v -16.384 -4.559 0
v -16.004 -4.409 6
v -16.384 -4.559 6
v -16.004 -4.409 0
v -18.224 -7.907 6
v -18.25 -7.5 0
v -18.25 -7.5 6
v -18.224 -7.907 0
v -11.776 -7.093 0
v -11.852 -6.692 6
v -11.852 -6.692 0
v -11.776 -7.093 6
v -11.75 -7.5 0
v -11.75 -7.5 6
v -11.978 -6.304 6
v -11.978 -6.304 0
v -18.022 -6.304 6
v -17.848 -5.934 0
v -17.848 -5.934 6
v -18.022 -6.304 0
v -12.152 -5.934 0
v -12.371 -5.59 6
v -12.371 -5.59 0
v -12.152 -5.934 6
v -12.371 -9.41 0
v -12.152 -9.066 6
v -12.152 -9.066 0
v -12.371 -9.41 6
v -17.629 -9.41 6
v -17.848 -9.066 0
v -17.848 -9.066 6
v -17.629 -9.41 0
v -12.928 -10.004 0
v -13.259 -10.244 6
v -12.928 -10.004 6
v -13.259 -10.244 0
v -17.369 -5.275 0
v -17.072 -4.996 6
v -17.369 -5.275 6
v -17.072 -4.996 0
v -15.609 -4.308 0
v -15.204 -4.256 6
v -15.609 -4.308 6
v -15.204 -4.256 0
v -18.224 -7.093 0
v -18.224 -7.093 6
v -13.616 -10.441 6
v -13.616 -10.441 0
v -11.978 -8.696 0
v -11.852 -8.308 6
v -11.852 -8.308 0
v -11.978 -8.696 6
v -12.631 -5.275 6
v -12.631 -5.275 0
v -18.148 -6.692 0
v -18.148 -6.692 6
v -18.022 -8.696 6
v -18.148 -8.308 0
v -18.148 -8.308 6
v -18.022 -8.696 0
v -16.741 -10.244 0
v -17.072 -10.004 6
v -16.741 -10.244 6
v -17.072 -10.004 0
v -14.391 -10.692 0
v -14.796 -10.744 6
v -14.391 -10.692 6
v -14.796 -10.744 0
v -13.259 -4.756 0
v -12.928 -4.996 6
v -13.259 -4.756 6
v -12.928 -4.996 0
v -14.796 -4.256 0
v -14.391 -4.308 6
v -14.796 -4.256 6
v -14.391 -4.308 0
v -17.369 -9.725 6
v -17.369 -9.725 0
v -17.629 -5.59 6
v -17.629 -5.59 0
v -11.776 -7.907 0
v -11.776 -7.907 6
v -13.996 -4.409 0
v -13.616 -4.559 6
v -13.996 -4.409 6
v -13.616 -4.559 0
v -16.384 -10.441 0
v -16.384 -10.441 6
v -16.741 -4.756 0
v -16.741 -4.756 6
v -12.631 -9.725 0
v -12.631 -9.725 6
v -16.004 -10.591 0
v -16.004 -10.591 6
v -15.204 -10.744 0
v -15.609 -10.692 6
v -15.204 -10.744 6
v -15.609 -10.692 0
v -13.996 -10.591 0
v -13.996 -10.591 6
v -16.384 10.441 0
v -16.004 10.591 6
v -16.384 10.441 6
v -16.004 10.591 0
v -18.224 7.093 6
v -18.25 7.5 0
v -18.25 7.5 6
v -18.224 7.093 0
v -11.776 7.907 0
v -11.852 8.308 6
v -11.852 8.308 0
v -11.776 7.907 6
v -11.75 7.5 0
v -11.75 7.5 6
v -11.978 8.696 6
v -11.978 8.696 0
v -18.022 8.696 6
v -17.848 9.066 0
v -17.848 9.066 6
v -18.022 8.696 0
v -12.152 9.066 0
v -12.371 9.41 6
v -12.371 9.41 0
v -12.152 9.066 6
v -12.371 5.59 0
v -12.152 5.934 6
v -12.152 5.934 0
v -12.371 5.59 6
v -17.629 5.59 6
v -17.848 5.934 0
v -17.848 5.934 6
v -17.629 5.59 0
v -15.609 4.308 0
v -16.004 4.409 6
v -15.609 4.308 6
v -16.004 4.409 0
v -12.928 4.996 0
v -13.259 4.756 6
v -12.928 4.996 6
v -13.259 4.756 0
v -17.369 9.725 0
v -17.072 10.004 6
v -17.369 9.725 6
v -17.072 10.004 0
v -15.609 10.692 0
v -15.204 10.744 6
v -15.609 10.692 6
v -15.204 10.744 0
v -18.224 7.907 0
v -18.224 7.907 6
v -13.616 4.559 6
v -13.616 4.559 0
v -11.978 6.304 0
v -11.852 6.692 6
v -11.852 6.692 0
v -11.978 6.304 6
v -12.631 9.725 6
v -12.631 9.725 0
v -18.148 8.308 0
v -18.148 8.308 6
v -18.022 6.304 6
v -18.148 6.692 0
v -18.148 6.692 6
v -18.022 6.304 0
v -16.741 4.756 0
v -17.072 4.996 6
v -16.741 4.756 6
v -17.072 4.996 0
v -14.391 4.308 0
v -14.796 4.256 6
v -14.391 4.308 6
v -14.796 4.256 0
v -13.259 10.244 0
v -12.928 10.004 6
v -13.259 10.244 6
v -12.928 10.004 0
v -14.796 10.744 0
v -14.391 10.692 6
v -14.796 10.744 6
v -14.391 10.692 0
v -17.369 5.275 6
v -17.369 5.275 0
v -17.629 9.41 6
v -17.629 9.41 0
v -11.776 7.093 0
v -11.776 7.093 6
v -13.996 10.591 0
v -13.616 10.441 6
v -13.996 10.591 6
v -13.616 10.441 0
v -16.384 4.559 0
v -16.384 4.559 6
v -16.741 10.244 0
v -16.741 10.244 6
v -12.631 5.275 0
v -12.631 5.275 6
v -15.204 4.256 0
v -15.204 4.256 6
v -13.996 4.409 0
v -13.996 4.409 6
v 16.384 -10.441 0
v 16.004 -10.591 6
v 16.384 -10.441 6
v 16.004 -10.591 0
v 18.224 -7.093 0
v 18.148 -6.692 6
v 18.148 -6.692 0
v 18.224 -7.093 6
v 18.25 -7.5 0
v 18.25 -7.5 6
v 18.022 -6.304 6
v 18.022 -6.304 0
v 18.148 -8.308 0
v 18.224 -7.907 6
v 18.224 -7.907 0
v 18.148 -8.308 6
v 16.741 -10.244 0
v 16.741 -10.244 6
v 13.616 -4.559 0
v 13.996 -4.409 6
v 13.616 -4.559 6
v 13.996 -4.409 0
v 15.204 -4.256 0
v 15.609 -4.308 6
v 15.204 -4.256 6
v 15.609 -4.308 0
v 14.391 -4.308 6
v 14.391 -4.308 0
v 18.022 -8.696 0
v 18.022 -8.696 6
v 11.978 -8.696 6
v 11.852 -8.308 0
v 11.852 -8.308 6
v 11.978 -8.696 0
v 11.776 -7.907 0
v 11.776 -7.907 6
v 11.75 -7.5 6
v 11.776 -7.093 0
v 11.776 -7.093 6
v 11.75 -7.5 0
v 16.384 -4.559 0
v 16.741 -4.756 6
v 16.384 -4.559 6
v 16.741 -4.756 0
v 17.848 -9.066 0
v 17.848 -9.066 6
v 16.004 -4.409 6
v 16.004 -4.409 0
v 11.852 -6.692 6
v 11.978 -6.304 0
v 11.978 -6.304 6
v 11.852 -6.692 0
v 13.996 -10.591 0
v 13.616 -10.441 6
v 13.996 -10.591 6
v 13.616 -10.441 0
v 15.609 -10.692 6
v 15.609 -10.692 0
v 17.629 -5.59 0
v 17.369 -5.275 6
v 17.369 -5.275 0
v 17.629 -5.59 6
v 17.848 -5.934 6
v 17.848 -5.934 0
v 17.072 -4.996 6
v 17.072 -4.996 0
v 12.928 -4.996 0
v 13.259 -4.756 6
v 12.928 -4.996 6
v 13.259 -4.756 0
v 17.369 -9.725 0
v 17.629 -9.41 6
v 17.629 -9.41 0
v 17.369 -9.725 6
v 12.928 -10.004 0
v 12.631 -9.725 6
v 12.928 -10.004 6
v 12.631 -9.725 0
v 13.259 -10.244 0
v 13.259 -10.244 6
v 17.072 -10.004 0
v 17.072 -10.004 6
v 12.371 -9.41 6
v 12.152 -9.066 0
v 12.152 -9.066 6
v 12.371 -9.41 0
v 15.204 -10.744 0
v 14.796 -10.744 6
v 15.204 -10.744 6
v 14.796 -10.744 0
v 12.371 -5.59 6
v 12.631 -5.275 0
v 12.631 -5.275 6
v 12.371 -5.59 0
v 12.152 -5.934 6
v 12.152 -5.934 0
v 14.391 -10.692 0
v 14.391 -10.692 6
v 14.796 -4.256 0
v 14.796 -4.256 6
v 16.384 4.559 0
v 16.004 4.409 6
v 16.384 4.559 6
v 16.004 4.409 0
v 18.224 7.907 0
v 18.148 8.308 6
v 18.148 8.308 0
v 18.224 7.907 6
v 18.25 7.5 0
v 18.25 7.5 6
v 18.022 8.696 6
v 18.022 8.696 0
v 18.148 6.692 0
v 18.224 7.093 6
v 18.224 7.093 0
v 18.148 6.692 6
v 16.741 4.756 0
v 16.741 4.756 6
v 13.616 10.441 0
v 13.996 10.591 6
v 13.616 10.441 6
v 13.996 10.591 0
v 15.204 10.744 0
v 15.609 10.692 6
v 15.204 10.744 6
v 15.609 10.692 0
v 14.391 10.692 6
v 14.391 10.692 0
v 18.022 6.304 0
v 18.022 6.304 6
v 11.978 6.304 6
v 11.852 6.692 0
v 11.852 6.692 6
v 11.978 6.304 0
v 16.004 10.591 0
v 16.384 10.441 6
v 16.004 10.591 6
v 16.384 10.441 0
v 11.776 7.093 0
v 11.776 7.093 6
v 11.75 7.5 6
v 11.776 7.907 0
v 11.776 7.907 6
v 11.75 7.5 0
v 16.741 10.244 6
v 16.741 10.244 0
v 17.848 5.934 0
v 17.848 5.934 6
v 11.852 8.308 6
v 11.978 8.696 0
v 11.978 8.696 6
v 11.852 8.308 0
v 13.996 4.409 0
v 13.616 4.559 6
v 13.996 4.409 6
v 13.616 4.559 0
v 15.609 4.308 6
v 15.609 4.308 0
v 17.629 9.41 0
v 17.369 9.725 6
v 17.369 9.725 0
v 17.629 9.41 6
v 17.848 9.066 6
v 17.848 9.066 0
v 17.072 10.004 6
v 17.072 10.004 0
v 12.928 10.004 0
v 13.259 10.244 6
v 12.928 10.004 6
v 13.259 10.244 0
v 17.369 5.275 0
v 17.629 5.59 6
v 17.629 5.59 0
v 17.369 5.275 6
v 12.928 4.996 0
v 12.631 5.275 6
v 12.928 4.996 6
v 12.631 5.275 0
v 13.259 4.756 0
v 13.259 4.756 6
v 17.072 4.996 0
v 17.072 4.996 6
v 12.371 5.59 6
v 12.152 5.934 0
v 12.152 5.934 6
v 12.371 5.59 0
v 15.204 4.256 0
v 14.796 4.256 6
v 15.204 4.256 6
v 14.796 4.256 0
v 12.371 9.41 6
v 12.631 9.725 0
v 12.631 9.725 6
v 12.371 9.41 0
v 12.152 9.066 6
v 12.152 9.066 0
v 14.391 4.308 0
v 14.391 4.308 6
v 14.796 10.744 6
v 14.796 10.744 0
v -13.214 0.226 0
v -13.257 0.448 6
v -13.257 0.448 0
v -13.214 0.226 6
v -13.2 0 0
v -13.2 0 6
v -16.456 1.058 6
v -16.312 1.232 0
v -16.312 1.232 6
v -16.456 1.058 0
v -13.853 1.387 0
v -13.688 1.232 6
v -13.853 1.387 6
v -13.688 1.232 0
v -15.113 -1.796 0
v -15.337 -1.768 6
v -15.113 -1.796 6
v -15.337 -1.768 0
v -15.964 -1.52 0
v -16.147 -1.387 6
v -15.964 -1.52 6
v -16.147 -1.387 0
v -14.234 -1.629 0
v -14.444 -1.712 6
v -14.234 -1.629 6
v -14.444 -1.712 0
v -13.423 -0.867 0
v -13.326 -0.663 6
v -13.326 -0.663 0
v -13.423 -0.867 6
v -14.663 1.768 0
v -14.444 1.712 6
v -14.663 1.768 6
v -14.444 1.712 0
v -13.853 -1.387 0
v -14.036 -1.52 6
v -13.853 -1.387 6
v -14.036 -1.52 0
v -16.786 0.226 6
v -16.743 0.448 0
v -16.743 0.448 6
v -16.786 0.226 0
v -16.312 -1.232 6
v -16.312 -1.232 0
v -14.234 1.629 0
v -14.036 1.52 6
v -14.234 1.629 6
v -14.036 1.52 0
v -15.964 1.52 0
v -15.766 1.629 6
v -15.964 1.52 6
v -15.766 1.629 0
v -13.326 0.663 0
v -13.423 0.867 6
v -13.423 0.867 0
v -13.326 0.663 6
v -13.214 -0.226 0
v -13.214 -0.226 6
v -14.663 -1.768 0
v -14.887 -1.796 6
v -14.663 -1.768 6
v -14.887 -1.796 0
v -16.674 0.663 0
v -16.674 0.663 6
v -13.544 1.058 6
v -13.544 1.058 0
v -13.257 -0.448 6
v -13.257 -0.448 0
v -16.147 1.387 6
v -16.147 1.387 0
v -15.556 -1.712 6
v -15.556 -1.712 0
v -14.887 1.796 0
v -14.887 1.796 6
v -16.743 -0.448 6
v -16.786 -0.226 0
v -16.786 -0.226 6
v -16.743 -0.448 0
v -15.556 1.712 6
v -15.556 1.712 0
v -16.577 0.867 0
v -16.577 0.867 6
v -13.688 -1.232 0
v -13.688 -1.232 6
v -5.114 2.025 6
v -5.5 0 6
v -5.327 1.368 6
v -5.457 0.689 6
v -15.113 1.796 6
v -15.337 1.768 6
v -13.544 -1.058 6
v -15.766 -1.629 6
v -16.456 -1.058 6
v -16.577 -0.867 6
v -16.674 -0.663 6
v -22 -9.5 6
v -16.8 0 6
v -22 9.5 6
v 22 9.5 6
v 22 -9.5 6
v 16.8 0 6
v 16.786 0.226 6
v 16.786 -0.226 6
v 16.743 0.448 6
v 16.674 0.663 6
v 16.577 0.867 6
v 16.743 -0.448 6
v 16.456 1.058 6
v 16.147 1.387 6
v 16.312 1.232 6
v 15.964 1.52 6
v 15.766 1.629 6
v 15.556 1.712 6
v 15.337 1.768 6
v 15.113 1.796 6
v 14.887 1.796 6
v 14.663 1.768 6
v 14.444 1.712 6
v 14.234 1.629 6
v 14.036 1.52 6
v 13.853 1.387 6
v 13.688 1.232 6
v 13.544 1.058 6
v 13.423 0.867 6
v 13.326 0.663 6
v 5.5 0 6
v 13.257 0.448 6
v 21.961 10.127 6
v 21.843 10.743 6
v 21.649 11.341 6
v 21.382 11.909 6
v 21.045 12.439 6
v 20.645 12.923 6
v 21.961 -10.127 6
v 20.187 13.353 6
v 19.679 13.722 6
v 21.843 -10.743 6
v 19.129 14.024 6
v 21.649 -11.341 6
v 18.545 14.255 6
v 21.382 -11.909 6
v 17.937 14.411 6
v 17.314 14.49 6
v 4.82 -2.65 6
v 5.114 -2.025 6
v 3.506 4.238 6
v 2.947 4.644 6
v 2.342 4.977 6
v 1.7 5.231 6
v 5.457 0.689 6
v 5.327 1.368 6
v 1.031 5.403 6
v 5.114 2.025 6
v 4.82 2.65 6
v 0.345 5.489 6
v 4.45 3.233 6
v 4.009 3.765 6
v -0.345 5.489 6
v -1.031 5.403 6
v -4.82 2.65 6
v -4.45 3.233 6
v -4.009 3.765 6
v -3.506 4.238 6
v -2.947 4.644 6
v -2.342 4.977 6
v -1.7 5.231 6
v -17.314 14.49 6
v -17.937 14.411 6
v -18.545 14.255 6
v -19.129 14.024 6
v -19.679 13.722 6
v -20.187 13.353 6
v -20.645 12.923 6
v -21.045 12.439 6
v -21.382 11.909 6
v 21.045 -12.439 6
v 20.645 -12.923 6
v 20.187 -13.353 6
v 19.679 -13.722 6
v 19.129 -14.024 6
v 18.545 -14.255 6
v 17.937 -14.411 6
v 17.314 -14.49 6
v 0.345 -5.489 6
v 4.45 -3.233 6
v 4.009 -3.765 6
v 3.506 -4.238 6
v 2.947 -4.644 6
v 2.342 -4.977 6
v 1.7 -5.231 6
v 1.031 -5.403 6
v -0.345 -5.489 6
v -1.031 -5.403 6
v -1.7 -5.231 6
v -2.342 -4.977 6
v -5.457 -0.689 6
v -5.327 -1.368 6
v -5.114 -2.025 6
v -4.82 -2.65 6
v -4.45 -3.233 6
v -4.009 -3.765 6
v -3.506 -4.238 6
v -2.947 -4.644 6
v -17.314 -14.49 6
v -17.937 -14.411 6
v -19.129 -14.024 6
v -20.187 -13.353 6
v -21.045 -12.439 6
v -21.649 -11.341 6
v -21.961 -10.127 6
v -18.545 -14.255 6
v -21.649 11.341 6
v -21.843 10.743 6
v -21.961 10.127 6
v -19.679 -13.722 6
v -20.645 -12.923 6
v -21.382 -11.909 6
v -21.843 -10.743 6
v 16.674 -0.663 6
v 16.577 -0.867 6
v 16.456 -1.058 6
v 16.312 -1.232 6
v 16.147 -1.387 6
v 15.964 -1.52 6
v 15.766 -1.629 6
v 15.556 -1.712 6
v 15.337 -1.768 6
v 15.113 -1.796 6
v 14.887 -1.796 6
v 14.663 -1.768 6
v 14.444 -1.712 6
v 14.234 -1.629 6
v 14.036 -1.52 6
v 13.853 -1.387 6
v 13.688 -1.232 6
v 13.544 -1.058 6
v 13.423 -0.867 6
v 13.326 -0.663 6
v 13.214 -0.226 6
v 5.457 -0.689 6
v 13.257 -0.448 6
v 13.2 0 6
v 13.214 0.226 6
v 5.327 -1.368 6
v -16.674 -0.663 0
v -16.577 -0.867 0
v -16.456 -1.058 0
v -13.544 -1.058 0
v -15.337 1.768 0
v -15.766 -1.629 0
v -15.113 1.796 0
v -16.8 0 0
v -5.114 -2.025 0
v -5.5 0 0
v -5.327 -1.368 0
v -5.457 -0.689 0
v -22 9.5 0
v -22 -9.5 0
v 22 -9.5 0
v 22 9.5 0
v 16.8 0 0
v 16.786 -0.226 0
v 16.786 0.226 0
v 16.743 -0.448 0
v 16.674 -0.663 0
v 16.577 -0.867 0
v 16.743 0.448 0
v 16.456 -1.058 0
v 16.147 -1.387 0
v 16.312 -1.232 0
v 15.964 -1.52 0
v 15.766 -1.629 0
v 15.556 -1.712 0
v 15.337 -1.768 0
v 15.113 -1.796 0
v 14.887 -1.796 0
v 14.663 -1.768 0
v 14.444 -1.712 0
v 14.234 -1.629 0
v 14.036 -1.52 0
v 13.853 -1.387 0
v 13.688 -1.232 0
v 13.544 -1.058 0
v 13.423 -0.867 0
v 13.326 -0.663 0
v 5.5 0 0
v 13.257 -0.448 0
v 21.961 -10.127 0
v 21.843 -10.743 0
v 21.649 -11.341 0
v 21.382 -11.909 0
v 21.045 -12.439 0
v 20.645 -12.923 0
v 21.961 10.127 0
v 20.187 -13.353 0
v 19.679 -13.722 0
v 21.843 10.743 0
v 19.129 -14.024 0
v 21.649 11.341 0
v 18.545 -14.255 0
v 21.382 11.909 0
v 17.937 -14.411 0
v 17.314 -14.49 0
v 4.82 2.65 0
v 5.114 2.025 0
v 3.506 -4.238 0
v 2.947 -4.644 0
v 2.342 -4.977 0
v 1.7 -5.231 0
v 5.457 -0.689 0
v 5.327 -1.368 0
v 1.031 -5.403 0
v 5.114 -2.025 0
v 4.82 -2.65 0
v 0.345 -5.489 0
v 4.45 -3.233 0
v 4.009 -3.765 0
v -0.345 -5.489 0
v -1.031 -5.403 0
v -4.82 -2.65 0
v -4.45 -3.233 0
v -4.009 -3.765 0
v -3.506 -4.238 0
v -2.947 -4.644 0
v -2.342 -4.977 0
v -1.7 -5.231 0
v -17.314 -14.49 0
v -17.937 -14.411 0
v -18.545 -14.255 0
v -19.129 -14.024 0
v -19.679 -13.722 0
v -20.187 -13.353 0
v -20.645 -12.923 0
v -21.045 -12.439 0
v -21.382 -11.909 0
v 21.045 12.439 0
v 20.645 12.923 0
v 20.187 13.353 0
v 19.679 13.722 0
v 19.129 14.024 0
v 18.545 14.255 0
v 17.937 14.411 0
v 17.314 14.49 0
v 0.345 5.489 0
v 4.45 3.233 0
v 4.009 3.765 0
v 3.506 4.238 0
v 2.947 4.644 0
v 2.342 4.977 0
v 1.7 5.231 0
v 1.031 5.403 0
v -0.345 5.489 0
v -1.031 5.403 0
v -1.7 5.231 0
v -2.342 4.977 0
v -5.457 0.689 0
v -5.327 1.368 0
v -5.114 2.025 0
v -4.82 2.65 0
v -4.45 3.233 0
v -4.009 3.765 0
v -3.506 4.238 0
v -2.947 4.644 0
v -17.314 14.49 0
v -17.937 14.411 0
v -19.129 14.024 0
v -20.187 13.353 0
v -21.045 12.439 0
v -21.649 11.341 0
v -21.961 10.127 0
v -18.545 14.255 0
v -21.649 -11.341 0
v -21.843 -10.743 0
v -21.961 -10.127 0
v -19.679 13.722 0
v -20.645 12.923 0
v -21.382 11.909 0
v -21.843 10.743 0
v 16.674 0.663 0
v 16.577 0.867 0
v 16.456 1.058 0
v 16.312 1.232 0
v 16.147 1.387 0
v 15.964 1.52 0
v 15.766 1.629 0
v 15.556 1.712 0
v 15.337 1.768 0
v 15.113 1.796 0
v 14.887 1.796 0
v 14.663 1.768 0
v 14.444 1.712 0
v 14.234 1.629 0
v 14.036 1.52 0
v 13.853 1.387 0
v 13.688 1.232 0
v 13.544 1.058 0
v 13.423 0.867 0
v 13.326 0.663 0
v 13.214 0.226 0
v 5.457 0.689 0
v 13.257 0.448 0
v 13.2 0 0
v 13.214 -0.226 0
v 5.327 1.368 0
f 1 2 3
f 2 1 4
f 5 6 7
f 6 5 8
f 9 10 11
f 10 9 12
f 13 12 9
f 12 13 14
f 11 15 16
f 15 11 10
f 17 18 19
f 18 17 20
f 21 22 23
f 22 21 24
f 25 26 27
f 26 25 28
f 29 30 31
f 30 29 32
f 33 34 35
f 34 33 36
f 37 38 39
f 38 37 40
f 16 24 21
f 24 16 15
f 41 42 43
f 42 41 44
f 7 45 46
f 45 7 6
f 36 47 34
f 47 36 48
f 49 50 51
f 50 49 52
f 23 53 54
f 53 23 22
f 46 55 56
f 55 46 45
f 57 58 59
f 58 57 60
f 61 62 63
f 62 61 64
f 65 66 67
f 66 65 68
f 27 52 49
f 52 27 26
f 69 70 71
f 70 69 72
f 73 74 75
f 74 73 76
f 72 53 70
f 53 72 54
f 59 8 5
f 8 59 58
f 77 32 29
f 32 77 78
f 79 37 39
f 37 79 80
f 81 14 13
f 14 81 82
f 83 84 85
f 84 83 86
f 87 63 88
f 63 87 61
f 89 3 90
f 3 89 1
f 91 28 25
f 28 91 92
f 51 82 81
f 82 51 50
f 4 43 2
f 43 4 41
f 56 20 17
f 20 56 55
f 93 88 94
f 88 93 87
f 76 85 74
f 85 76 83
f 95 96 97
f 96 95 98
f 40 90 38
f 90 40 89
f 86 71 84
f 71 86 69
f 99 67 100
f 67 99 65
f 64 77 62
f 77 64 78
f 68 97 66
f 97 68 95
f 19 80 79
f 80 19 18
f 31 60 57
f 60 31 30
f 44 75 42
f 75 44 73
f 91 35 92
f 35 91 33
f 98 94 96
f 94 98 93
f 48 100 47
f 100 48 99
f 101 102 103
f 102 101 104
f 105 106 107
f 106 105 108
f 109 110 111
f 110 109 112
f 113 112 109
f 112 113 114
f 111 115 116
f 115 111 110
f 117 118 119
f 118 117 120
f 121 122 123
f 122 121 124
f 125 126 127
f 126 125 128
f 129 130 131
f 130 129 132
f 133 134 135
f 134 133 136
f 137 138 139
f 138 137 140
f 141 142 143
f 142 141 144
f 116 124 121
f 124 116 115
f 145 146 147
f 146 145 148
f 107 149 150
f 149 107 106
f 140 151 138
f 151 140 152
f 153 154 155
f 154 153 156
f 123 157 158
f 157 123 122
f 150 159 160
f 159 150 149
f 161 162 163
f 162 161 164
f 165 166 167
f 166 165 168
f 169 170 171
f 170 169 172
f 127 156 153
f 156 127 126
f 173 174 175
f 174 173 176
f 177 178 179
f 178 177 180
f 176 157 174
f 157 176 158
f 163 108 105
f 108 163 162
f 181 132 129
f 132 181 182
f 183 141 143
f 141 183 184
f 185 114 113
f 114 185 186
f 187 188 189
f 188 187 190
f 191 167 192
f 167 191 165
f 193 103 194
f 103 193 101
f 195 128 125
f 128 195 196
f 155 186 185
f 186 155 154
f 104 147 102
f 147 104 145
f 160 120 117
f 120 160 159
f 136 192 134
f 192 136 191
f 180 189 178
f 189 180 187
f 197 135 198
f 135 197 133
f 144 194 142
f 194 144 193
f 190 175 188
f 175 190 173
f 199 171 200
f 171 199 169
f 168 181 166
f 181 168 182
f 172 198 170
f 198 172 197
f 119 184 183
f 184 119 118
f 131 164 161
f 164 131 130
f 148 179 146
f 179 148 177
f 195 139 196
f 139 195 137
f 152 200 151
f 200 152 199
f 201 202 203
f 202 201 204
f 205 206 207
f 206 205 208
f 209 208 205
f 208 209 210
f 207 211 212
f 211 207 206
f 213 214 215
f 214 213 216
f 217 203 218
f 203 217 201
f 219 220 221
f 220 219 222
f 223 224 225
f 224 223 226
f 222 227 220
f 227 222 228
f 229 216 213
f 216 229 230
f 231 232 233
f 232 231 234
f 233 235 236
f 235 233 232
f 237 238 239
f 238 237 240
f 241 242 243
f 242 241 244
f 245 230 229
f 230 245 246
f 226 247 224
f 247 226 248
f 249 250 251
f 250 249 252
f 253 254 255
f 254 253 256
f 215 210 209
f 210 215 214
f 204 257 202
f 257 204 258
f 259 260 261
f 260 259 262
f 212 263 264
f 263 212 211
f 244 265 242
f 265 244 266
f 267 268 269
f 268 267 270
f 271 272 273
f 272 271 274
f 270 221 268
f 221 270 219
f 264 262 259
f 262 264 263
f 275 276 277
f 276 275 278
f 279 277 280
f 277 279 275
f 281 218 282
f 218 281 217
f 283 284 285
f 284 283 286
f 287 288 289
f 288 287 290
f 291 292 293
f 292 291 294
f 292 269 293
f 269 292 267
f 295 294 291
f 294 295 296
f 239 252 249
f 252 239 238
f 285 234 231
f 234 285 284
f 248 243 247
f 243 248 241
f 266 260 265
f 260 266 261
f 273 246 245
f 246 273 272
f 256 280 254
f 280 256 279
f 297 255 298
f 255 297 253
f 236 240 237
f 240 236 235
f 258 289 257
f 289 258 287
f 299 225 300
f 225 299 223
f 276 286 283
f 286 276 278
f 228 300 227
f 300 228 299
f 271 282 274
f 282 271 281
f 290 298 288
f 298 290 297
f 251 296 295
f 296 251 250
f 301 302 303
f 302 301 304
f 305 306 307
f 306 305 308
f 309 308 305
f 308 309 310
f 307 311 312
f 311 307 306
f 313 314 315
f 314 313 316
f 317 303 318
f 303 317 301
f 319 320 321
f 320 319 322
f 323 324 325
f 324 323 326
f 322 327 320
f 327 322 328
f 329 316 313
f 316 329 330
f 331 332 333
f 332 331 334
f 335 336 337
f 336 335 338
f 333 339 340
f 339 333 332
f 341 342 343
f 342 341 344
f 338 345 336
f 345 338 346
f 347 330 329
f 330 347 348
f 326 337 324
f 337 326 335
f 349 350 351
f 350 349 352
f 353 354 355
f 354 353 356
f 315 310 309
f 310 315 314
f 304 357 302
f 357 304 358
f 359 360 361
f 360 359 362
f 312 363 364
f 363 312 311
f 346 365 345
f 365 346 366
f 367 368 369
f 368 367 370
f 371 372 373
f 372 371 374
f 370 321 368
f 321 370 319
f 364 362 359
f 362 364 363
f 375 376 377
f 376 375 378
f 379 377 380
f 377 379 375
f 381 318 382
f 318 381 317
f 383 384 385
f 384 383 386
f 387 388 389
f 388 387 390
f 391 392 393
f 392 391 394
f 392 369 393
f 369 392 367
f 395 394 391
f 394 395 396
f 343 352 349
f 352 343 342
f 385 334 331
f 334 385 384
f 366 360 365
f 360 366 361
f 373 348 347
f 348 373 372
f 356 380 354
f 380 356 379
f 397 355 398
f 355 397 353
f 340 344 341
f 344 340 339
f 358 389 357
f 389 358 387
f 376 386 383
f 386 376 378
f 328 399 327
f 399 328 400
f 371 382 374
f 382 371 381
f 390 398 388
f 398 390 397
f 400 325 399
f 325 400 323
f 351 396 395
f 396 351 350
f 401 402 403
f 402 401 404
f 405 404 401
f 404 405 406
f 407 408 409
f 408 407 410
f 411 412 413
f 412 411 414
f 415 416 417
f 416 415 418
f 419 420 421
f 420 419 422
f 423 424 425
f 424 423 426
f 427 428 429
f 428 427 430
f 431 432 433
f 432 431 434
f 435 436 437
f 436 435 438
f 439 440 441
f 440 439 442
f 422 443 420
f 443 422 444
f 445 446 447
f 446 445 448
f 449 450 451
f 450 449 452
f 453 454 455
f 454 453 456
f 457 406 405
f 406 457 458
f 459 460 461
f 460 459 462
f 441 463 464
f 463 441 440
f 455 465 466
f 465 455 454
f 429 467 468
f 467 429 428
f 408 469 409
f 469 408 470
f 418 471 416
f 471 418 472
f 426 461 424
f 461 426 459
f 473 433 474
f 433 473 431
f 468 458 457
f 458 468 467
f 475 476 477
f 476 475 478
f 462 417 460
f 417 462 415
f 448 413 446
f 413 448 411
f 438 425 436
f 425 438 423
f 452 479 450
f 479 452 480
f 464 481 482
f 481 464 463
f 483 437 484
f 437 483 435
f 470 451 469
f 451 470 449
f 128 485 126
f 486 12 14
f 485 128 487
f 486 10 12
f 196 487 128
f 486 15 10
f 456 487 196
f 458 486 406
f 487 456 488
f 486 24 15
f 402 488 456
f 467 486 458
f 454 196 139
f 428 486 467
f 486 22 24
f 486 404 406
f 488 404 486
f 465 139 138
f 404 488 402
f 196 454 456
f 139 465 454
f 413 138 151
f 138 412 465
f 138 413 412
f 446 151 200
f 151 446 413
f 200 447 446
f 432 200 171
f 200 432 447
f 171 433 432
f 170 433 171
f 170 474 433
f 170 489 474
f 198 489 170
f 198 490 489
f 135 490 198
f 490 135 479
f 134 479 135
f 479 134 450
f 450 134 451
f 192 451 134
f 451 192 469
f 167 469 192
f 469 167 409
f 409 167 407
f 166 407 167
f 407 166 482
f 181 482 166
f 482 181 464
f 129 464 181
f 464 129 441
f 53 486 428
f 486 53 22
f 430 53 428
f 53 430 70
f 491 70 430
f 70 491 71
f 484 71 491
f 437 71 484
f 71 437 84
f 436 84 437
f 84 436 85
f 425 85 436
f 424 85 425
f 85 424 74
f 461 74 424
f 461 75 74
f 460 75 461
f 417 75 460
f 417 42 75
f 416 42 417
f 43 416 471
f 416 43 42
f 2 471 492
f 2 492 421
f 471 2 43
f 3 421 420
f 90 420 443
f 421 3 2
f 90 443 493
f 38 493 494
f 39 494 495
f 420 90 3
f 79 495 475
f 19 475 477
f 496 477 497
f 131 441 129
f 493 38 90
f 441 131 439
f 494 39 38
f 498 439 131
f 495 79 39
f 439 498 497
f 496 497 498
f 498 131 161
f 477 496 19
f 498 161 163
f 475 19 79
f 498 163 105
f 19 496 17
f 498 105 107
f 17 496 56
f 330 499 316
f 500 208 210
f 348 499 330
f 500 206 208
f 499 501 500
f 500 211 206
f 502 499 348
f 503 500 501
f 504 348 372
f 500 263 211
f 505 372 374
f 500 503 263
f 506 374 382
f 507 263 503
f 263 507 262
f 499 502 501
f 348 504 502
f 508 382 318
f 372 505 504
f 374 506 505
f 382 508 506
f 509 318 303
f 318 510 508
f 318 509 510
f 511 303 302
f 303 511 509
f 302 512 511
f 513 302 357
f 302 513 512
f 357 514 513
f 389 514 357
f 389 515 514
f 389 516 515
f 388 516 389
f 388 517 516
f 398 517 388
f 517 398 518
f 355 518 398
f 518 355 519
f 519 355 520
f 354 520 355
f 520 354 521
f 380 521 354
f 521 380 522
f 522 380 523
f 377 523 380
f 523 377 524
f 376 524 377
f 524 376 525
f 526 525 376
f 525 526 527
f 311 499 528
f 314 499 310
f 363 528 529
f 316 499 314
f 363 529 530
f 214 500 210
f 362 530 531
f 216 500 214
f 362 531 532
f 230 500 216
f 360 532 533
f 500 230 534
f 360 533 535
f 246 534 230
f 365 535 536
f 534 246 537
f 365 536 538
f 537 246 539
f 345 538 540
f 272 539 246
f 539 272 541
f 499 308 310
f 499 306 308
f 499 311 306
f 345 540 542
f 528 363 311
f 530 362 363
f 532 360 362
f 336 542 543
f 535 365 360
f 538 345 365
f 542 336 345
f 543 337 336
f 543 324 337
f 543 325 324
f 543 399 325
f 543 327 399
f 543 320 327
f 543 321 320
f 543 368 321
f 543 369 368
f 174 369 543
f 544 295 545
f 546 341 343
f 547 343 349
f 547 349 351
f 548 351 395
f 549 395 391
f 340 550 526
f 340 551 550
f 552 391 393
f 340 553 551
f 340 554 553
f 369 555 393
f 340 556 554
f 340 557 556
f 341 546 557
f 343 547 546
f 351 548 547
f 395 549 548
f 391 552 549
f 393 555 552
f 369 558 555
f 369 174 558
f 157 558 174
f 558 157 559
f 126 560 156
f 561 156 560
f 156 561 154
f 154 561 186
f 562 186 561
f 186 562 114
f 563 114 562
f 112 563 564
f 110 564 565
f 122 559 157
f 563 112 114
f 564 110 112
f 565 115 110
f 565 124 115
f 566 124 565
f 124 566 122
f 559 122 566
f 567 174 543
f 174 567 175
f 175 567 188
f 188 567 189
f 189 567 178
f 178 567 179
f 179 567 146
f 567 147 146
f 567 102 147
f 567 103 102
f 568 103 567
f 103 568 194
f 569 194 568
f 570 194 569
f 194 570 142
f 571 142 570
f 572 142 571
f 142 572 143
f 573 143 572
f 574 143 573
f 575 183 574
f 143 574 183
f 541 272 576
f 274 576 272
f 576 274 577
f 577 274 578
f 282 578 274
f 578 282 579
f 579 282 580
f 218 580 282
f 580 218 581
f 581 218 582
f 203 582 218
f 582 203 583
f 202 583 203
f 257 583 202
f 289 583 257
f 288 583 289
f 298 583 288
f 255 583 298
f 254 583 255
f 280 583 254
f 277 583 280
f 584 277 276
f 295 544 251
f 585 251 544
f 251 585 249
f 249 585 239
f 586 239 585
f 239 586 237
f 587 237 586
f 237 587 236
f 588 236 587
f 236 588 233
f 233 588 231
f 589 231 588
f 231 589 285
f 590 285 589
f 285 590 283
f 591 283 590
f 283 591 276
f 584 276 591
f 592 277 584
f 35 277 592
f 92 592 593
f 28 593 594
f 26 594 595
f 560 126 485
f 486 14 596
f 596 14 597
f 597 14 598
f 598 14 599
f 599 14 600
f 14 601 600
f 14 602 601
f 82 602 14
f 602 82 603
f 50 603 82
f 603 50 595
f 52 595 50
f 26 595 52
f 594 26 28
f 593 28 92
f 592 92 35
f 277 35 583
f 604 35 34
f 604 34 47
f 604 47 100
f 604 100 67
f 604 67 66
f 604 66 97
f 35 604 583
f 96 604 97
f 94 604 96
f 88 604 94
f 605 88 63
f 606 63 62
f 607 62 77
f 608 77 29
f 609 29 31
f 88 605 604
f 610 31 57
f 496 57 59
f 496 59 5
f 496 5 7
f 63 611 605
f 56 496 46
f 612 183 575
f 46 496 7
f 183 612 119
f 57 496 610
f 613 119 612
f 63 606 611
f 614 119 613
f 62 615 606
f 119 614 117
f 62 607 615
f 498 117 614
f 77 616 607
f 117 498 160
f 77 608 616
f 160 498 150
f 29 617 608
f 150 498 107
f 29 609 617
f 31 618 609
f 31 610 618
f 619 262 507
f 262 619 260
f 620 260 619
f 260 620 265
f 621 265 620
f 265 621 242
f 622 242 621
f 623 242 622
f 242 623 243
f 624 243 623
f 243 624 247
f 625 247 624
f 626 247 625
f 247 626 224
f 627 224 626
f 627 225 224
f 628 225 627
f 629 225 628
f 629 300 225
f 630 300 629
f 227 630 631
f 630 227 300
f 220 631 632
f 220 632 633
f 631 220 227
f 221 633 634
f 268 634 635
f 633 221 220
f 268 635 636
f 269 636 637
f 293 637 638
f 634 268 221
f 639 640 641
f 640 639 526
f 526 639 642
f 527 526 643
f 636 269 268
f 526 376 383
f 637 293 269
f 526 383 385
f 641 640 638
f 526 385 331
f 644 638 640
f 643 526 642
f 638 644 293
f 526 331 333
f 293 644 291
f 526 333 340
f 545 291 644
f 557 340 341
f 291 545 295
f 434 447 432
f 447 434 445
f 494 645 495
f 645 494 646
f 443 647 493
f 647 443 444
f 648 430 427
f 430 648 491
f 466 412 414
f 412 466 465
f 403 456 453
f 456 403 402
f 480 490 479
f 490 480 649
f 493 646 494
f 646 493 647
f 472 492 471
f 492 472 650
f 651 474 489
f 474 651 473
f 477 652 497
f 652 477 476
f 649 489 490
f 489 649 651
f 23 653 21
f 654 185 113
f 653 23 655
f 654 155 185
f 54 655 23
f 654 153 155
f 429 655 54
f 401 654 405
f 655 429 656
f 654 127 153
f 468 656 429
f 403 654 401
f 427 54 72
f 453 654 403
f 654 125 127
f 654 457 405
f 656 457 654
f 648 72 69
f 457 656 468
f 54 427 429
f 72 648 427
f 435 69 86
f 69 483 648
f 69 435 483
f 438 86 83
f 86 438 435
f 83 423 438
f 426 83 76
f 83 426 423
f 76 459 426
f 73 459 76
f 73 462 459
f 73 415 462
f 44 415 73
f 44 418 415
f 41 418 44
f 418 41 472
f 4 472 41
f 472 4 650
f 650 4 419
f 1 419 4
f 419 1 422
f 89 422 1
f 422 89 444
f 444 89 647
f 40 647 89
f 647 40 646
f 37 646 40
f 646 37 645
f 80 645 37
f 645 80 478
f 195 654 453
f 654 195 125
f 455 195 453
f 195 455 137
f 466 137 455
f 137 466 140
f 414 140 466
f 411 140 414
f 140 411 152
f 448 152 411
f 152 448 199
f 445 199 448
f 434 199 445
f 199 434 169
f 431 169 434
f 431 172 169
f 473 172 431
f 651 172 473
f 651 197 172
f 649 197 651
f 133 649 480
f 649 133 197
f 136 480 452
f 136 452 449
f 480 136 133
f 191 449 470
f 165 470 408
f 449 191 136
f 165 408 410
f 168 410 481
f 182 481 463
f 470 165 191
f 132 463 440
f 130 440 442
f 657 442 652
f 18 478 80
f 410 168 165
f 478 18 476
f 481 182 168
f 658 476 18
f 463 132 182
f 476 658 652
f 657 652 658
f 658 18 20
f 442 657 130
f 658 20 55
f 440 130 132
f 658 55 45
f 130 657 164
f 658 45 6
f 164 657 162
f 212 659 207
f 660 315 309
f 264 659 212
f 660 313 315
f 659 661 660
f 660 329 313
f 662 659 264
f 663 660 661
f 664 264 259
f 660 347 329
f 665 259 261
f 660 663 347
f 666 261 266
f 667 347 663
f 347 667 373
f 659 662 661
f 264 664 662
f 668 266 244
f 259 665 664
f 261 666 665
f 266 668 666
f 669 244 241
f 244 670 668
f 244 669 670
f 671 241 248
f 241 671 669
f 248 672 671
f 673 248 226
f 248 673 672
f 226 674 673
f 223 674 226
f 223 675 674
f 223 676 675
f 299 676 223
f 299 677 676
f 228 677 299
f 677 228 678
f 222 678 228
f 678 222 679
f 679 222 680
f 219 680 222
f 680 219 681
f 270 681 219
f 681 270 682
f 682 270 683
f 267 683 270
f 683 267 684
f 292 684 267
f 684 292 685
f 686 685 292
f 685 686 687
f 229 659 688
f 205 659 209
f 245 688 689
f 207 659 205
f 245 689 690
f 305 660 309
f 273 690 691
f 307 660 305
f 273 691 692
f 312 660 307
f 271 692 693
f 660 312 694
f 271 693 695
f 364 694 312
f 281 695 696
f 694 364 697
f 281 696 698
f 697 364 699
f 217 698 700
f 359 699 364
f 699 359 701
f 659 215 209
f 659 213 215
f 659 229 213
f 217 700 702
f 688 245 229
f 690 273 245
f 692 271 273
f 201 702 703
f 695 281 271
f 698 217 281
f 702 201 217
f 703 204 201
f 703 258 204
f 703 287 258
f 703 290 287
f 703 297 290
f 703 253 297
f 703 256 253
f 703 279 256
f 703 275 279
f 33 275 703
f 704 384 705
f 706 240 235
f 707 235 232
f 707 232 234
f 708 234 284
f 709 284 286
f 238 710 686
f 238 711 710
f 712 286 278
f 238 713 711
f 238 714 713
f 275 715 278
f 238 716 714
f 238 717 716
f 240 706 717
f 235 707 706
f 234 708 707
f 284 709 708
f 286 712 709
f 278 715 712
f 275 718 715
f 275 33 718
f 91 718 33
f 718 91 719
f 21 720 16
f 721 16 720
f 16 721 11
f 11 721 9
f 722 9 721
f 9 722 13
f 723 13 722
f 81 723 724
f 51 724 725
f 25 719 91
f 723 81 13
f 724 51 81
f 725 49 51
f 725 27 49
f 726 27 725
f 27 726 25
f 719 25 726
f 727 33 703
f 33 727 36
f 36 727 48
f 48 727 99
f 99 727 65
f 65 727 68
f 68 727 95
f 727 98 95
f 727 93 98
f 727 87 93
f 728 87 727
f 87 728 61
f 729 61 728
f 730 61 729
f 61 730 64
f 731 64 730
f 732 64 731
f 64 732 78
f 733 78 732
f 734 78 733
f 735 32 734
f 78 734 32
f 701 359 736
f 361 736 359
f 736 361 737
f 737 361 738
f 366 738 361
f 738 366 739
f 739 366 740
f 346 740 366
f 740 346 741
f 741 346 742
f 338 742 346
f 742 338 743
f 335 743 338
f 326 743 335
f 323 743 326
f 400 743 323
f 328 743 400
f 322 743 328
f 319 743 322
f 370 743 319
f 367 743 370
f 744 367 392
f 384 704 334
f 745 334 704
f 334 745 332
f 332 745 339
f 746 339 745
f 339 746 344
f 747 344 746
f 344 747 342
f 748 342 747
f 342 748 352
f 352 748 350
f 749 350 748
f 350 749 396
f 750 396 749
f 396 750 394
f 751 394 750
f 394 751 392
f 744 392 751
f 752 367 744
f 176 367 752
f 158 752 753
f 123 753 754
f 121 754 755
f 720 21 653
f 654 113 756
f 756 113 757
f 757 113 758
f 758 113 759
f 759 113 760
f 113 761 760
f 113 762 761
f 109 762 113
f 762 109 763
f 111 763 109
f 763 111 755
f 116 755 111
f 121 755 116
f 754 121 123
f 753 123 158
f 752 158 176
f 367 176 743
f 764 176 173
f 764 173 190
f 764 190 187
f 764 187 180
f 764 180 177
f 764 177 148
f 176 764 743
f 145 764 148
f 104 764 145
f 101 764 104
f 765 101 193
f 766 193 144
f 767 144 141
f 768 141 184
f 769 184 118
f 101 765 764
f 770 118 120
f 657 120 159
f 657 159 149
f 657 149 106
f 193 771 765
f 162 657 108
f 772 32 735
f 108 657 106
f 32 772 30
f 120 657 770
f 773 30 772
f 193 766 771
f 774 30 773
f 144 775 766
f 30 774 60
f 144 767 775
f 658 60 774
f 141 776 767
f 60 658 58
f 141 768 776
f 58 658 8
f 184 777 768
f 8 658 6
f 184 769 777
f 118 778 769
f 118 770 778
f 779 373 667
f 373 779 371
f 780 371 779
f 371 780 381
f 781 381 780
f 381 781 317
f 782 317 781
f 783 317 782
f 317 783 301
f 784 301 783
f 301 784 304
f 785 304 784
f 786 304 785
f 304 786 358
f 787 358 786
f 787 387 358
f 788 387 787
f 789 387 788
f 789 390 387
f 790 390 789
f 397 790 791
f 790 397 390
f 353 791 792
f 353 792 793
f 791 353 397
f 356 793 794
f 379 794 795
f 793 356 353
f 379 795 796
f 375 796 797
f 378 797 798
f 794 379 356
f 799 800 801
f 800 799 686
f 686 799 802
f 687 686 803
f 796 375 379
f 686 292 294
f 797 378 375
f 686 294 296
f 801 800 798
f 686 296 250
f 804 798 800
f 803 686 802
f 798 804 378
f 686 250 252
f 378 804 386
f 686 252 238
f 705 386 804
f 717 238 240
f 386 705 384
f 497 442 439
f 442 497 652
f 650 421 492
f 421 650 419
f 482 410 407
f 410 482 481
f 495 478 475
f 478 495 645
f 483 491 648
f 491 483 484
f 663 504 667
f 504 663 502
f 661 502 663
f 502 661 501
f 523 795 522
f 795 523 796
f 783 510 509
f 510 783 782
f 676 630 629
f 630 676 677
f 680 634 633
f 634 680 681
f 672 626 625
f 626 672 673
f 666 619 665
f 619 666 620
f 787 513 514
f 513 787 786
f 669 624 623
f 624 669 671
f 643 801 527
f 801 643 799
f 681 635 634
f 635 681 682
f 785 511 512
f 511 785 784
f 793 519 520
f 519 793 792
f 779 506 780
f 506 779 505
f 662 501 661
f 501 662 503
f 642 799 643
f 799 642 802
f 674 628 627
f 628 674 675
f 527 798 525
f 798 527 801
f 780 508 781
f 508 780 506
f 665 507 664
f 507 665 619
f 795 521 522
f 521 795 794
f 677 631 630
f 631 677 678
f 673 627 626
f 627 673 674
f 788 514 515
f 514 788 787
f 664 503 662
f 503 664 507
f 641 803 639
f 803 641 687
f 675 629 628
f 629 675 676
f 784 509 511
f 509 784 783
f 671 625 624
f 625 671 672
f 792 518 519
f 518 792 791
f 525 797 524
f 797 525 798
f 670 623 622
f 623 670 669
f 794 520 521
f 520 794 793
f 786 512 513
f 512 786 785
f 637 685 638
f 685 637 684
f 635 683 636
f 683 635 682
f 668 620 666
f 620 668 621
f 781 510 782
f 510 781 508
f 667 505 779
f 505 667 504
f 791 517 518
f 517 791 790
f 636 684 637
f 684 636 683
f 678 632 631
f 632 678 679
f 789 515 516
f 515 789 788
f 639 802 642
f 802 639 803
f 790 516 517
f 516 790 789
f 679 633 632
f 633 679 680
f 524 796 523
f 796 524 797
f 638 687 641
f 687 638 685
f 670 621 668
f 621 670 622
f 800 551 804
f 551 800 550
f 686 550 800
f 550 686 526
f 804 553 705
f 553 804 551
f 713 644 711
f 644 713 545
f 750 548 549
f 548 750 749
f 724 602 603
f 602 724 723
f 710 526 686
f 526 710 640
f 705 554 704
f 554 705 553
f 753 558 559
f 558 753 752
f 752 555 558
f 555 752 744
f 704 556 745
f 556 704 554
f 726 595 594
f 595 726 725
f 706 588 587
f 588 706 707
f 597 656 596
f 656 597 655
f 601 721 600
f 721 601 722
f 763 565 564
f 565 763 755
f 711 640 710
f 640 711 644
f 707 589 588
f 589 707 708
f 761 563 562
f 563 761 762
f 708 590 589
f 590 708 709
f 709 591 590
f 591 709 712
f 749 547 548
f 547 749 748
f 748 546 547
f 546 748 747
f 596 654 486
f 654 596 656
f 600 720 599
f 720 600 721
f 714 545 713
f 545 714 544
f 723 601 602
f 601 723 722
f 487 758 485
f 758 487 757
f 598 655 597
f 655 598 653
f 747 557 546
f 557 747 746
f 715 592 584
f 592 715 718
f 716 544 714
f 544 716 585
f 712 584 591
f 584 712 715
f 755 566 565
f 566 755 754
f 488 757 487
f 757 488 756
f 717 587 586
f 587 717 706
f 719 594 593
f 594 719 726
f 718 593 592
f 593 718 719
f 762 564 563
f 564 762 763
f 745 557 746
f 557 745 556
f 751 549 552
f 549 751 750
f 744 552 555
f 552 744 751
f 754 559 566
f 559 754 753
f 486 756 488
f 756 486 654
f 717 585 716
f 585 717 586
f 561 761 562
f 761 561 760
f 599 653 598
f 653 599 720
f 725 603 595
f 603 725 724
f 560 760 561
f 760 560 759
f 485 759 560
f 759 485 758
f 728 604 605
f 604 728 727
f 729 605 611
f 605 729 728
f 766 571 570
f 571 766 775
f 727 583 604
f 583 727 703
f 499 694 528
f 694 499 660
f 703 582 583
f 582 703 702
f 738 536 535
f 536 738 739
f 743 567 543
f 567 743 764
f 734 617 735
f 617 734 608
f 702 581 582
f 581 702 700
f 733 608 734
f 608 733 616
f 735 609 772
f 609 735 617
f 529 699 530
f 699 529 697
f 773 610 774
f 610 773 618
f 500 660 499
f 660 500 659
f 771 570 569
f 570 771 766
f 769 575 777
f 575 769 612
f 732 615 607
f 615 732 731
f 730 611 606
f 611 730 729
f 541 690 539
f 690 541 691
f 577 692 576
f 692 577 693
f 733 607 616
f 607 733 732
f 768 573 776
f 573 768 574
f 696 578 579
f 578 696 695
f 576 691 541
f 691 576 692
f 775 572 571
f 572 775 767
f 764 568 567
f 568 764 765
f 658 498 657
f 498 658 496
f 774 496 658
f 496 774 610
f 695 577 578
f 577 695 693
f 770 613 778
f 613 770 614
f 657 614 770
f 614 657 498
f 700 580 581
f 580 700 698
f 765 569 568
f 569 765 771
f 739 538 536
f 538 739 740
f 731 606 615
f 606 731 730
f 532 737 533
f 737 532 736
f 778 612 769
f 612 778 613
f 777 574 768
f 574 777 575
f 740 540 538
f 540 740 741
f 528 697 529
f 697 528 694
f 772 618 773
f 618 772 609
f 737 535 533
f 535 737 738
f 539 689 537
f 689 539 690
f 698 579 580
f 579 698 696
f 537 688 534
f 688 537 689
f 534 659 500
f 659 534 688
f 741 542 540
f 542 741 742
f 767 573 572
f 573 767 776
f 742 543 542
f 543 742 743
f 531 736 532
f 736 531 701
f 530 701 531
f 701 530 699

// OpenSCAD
$fn = 50;


difference() {
	union() {
		hull() {
			translate(v = [-17.0000000000, 9.5000000000, 0]) {
				cylinder(h = 6, r = 5);
			}
			translate(v = [17.0000000000, 9.5000000000, 0]) {
				cylinder(h = 6, r = 5);
			}
			translate(v = [-17.0000000000, -9.5000000000, 0]) {
				cylinder(h = 6, r = 5);
			}
			translate(v = [17.0000000000, -9.5000000000, 0]) {
				cylinder(h = 6, r = 5);
			}
		}
	}
	union() {
		#translate(v = [-15.0000000000, -7.5000000000, 0]) {
			cylinder(h = 6, r = 3.2500000000);
		}
		#translate(v = [-15.0000000000, 7.5000000000, 0]) {
			cylinder(h = 6, r = 3.2500000000);
		}
		#translate(v = [15.0000000000, -7.5000000000, 0]) {
			cylinder(h = 6, r = 3.2500000000);
		}
		#translate(v = [15.0000000000, 7.5000000000, 0]) {
			cylinder(h = 6, r = 3.2500000000);
		}
		#translate(v = [-15.0000000000, -7.5000000000, -100.0000000000]) {
			cylinder(h = 200, r = 3.2500000000);
		}
		#translate(v = [-15.0000000000, 7.5000000000, -100.0000000000]) {
			cylinder(h = 200, r = 3.2500000000);
		}
		#translate(v = [15.0000000000, -7.5000000000, -100.0000000000]) {
			cylinder(h = 200, r = 3.2500000000);
		}
		#translate(v = [15.0000000000, 7.5000000000, -100.0000000000]) {
			cylinder(h = 200, r = 3.2500000000);
		}
		#translate(v = [-15.0000000000, -7.5000000000, 0]) {
			cylinder(h = 6, r = 1.8000000000);
		}
		#translate(v = [-15.0000000000, 0.0000000000, 0]) {
			cylinder(h = 6, r = 1.8000000000);
		}
		#translate(v = [-15.0000000000, 7.5000000000, 0]) {
			cylinder(h = 6, r = 1.8000000000);
		}
		#translate(v = [15.0000000000, -7.5000000000, 0]) {
			cylinder(h = 6, r = 1.8000000000);
		}
		#translate(v = [15.0000000000, 0.0000000000, 0]) {
			cylinder(h = 6, r = 1.8000000000);
		}
		#translate(v = [15.0000000000, 7.5000000000, 0]) {
			cylinder(h = 6, r = 1.8000000000);
		}
		#translate(v = [-15.0000000000, -7.5000000000, 0]) {
			cylinder(h = 6, r = 1.8000000000);
		}
		#translate(v = [-15.0000000000, 0.0000000000, 0]) {
			cylinder(h = 6, r = 1.8000000000);
		}
		#translate(v = [-15.0000000000, 7.5000000000, 0]) {
			cylinder(h = 6, r = 1.8000000000);
		}
		#translate(v = [15.0000000000, -7.5000000000, 0]) {
			cylinder(h = 6, r = 1.8000000000);
		}
		#translate(v = [15.0000000000, 0.0000000000, 0]) {
			cylinder(h = 6, r = 1.8000000000);
		}
		#translate(v = [15.0000000000, 7.5000000000, 0]) {
			cylinder(h = 6, r = 1.8000000000);
		}
		#translate(v = [-15.0000000000, -7.5000000000, 0]) {
			cylinder(h = 6, r = 1.8000000000);
		}
		#translate(v = [-15.0000000000, 0.0000000000, 0]) {
			cylinder(h = 6, r = 1.8000000000);
		}
		#translate(v = [-15.0000000000, 7.5000000000, 0]) {
			cylinder(h = 6, r = 1.8000000000);
		}
		#translate(v = [15.0000000000, -7.5000000000, 0]) {
			cylinder(h = 6, r = 1.8000000000);
		}
		#translate(v = [15.0000000000, 0.0000000000, 0]) {
			cylinder(h = 6, r = 1.8000000000);
		}
		#translate(v = [15.0000000000, 7.5000000000, 0]) {
			cylinder(h = 6, r = 1.8000000000);
		}
		#cylinder(h = 6, r = 5.5000000000);
	}
}
